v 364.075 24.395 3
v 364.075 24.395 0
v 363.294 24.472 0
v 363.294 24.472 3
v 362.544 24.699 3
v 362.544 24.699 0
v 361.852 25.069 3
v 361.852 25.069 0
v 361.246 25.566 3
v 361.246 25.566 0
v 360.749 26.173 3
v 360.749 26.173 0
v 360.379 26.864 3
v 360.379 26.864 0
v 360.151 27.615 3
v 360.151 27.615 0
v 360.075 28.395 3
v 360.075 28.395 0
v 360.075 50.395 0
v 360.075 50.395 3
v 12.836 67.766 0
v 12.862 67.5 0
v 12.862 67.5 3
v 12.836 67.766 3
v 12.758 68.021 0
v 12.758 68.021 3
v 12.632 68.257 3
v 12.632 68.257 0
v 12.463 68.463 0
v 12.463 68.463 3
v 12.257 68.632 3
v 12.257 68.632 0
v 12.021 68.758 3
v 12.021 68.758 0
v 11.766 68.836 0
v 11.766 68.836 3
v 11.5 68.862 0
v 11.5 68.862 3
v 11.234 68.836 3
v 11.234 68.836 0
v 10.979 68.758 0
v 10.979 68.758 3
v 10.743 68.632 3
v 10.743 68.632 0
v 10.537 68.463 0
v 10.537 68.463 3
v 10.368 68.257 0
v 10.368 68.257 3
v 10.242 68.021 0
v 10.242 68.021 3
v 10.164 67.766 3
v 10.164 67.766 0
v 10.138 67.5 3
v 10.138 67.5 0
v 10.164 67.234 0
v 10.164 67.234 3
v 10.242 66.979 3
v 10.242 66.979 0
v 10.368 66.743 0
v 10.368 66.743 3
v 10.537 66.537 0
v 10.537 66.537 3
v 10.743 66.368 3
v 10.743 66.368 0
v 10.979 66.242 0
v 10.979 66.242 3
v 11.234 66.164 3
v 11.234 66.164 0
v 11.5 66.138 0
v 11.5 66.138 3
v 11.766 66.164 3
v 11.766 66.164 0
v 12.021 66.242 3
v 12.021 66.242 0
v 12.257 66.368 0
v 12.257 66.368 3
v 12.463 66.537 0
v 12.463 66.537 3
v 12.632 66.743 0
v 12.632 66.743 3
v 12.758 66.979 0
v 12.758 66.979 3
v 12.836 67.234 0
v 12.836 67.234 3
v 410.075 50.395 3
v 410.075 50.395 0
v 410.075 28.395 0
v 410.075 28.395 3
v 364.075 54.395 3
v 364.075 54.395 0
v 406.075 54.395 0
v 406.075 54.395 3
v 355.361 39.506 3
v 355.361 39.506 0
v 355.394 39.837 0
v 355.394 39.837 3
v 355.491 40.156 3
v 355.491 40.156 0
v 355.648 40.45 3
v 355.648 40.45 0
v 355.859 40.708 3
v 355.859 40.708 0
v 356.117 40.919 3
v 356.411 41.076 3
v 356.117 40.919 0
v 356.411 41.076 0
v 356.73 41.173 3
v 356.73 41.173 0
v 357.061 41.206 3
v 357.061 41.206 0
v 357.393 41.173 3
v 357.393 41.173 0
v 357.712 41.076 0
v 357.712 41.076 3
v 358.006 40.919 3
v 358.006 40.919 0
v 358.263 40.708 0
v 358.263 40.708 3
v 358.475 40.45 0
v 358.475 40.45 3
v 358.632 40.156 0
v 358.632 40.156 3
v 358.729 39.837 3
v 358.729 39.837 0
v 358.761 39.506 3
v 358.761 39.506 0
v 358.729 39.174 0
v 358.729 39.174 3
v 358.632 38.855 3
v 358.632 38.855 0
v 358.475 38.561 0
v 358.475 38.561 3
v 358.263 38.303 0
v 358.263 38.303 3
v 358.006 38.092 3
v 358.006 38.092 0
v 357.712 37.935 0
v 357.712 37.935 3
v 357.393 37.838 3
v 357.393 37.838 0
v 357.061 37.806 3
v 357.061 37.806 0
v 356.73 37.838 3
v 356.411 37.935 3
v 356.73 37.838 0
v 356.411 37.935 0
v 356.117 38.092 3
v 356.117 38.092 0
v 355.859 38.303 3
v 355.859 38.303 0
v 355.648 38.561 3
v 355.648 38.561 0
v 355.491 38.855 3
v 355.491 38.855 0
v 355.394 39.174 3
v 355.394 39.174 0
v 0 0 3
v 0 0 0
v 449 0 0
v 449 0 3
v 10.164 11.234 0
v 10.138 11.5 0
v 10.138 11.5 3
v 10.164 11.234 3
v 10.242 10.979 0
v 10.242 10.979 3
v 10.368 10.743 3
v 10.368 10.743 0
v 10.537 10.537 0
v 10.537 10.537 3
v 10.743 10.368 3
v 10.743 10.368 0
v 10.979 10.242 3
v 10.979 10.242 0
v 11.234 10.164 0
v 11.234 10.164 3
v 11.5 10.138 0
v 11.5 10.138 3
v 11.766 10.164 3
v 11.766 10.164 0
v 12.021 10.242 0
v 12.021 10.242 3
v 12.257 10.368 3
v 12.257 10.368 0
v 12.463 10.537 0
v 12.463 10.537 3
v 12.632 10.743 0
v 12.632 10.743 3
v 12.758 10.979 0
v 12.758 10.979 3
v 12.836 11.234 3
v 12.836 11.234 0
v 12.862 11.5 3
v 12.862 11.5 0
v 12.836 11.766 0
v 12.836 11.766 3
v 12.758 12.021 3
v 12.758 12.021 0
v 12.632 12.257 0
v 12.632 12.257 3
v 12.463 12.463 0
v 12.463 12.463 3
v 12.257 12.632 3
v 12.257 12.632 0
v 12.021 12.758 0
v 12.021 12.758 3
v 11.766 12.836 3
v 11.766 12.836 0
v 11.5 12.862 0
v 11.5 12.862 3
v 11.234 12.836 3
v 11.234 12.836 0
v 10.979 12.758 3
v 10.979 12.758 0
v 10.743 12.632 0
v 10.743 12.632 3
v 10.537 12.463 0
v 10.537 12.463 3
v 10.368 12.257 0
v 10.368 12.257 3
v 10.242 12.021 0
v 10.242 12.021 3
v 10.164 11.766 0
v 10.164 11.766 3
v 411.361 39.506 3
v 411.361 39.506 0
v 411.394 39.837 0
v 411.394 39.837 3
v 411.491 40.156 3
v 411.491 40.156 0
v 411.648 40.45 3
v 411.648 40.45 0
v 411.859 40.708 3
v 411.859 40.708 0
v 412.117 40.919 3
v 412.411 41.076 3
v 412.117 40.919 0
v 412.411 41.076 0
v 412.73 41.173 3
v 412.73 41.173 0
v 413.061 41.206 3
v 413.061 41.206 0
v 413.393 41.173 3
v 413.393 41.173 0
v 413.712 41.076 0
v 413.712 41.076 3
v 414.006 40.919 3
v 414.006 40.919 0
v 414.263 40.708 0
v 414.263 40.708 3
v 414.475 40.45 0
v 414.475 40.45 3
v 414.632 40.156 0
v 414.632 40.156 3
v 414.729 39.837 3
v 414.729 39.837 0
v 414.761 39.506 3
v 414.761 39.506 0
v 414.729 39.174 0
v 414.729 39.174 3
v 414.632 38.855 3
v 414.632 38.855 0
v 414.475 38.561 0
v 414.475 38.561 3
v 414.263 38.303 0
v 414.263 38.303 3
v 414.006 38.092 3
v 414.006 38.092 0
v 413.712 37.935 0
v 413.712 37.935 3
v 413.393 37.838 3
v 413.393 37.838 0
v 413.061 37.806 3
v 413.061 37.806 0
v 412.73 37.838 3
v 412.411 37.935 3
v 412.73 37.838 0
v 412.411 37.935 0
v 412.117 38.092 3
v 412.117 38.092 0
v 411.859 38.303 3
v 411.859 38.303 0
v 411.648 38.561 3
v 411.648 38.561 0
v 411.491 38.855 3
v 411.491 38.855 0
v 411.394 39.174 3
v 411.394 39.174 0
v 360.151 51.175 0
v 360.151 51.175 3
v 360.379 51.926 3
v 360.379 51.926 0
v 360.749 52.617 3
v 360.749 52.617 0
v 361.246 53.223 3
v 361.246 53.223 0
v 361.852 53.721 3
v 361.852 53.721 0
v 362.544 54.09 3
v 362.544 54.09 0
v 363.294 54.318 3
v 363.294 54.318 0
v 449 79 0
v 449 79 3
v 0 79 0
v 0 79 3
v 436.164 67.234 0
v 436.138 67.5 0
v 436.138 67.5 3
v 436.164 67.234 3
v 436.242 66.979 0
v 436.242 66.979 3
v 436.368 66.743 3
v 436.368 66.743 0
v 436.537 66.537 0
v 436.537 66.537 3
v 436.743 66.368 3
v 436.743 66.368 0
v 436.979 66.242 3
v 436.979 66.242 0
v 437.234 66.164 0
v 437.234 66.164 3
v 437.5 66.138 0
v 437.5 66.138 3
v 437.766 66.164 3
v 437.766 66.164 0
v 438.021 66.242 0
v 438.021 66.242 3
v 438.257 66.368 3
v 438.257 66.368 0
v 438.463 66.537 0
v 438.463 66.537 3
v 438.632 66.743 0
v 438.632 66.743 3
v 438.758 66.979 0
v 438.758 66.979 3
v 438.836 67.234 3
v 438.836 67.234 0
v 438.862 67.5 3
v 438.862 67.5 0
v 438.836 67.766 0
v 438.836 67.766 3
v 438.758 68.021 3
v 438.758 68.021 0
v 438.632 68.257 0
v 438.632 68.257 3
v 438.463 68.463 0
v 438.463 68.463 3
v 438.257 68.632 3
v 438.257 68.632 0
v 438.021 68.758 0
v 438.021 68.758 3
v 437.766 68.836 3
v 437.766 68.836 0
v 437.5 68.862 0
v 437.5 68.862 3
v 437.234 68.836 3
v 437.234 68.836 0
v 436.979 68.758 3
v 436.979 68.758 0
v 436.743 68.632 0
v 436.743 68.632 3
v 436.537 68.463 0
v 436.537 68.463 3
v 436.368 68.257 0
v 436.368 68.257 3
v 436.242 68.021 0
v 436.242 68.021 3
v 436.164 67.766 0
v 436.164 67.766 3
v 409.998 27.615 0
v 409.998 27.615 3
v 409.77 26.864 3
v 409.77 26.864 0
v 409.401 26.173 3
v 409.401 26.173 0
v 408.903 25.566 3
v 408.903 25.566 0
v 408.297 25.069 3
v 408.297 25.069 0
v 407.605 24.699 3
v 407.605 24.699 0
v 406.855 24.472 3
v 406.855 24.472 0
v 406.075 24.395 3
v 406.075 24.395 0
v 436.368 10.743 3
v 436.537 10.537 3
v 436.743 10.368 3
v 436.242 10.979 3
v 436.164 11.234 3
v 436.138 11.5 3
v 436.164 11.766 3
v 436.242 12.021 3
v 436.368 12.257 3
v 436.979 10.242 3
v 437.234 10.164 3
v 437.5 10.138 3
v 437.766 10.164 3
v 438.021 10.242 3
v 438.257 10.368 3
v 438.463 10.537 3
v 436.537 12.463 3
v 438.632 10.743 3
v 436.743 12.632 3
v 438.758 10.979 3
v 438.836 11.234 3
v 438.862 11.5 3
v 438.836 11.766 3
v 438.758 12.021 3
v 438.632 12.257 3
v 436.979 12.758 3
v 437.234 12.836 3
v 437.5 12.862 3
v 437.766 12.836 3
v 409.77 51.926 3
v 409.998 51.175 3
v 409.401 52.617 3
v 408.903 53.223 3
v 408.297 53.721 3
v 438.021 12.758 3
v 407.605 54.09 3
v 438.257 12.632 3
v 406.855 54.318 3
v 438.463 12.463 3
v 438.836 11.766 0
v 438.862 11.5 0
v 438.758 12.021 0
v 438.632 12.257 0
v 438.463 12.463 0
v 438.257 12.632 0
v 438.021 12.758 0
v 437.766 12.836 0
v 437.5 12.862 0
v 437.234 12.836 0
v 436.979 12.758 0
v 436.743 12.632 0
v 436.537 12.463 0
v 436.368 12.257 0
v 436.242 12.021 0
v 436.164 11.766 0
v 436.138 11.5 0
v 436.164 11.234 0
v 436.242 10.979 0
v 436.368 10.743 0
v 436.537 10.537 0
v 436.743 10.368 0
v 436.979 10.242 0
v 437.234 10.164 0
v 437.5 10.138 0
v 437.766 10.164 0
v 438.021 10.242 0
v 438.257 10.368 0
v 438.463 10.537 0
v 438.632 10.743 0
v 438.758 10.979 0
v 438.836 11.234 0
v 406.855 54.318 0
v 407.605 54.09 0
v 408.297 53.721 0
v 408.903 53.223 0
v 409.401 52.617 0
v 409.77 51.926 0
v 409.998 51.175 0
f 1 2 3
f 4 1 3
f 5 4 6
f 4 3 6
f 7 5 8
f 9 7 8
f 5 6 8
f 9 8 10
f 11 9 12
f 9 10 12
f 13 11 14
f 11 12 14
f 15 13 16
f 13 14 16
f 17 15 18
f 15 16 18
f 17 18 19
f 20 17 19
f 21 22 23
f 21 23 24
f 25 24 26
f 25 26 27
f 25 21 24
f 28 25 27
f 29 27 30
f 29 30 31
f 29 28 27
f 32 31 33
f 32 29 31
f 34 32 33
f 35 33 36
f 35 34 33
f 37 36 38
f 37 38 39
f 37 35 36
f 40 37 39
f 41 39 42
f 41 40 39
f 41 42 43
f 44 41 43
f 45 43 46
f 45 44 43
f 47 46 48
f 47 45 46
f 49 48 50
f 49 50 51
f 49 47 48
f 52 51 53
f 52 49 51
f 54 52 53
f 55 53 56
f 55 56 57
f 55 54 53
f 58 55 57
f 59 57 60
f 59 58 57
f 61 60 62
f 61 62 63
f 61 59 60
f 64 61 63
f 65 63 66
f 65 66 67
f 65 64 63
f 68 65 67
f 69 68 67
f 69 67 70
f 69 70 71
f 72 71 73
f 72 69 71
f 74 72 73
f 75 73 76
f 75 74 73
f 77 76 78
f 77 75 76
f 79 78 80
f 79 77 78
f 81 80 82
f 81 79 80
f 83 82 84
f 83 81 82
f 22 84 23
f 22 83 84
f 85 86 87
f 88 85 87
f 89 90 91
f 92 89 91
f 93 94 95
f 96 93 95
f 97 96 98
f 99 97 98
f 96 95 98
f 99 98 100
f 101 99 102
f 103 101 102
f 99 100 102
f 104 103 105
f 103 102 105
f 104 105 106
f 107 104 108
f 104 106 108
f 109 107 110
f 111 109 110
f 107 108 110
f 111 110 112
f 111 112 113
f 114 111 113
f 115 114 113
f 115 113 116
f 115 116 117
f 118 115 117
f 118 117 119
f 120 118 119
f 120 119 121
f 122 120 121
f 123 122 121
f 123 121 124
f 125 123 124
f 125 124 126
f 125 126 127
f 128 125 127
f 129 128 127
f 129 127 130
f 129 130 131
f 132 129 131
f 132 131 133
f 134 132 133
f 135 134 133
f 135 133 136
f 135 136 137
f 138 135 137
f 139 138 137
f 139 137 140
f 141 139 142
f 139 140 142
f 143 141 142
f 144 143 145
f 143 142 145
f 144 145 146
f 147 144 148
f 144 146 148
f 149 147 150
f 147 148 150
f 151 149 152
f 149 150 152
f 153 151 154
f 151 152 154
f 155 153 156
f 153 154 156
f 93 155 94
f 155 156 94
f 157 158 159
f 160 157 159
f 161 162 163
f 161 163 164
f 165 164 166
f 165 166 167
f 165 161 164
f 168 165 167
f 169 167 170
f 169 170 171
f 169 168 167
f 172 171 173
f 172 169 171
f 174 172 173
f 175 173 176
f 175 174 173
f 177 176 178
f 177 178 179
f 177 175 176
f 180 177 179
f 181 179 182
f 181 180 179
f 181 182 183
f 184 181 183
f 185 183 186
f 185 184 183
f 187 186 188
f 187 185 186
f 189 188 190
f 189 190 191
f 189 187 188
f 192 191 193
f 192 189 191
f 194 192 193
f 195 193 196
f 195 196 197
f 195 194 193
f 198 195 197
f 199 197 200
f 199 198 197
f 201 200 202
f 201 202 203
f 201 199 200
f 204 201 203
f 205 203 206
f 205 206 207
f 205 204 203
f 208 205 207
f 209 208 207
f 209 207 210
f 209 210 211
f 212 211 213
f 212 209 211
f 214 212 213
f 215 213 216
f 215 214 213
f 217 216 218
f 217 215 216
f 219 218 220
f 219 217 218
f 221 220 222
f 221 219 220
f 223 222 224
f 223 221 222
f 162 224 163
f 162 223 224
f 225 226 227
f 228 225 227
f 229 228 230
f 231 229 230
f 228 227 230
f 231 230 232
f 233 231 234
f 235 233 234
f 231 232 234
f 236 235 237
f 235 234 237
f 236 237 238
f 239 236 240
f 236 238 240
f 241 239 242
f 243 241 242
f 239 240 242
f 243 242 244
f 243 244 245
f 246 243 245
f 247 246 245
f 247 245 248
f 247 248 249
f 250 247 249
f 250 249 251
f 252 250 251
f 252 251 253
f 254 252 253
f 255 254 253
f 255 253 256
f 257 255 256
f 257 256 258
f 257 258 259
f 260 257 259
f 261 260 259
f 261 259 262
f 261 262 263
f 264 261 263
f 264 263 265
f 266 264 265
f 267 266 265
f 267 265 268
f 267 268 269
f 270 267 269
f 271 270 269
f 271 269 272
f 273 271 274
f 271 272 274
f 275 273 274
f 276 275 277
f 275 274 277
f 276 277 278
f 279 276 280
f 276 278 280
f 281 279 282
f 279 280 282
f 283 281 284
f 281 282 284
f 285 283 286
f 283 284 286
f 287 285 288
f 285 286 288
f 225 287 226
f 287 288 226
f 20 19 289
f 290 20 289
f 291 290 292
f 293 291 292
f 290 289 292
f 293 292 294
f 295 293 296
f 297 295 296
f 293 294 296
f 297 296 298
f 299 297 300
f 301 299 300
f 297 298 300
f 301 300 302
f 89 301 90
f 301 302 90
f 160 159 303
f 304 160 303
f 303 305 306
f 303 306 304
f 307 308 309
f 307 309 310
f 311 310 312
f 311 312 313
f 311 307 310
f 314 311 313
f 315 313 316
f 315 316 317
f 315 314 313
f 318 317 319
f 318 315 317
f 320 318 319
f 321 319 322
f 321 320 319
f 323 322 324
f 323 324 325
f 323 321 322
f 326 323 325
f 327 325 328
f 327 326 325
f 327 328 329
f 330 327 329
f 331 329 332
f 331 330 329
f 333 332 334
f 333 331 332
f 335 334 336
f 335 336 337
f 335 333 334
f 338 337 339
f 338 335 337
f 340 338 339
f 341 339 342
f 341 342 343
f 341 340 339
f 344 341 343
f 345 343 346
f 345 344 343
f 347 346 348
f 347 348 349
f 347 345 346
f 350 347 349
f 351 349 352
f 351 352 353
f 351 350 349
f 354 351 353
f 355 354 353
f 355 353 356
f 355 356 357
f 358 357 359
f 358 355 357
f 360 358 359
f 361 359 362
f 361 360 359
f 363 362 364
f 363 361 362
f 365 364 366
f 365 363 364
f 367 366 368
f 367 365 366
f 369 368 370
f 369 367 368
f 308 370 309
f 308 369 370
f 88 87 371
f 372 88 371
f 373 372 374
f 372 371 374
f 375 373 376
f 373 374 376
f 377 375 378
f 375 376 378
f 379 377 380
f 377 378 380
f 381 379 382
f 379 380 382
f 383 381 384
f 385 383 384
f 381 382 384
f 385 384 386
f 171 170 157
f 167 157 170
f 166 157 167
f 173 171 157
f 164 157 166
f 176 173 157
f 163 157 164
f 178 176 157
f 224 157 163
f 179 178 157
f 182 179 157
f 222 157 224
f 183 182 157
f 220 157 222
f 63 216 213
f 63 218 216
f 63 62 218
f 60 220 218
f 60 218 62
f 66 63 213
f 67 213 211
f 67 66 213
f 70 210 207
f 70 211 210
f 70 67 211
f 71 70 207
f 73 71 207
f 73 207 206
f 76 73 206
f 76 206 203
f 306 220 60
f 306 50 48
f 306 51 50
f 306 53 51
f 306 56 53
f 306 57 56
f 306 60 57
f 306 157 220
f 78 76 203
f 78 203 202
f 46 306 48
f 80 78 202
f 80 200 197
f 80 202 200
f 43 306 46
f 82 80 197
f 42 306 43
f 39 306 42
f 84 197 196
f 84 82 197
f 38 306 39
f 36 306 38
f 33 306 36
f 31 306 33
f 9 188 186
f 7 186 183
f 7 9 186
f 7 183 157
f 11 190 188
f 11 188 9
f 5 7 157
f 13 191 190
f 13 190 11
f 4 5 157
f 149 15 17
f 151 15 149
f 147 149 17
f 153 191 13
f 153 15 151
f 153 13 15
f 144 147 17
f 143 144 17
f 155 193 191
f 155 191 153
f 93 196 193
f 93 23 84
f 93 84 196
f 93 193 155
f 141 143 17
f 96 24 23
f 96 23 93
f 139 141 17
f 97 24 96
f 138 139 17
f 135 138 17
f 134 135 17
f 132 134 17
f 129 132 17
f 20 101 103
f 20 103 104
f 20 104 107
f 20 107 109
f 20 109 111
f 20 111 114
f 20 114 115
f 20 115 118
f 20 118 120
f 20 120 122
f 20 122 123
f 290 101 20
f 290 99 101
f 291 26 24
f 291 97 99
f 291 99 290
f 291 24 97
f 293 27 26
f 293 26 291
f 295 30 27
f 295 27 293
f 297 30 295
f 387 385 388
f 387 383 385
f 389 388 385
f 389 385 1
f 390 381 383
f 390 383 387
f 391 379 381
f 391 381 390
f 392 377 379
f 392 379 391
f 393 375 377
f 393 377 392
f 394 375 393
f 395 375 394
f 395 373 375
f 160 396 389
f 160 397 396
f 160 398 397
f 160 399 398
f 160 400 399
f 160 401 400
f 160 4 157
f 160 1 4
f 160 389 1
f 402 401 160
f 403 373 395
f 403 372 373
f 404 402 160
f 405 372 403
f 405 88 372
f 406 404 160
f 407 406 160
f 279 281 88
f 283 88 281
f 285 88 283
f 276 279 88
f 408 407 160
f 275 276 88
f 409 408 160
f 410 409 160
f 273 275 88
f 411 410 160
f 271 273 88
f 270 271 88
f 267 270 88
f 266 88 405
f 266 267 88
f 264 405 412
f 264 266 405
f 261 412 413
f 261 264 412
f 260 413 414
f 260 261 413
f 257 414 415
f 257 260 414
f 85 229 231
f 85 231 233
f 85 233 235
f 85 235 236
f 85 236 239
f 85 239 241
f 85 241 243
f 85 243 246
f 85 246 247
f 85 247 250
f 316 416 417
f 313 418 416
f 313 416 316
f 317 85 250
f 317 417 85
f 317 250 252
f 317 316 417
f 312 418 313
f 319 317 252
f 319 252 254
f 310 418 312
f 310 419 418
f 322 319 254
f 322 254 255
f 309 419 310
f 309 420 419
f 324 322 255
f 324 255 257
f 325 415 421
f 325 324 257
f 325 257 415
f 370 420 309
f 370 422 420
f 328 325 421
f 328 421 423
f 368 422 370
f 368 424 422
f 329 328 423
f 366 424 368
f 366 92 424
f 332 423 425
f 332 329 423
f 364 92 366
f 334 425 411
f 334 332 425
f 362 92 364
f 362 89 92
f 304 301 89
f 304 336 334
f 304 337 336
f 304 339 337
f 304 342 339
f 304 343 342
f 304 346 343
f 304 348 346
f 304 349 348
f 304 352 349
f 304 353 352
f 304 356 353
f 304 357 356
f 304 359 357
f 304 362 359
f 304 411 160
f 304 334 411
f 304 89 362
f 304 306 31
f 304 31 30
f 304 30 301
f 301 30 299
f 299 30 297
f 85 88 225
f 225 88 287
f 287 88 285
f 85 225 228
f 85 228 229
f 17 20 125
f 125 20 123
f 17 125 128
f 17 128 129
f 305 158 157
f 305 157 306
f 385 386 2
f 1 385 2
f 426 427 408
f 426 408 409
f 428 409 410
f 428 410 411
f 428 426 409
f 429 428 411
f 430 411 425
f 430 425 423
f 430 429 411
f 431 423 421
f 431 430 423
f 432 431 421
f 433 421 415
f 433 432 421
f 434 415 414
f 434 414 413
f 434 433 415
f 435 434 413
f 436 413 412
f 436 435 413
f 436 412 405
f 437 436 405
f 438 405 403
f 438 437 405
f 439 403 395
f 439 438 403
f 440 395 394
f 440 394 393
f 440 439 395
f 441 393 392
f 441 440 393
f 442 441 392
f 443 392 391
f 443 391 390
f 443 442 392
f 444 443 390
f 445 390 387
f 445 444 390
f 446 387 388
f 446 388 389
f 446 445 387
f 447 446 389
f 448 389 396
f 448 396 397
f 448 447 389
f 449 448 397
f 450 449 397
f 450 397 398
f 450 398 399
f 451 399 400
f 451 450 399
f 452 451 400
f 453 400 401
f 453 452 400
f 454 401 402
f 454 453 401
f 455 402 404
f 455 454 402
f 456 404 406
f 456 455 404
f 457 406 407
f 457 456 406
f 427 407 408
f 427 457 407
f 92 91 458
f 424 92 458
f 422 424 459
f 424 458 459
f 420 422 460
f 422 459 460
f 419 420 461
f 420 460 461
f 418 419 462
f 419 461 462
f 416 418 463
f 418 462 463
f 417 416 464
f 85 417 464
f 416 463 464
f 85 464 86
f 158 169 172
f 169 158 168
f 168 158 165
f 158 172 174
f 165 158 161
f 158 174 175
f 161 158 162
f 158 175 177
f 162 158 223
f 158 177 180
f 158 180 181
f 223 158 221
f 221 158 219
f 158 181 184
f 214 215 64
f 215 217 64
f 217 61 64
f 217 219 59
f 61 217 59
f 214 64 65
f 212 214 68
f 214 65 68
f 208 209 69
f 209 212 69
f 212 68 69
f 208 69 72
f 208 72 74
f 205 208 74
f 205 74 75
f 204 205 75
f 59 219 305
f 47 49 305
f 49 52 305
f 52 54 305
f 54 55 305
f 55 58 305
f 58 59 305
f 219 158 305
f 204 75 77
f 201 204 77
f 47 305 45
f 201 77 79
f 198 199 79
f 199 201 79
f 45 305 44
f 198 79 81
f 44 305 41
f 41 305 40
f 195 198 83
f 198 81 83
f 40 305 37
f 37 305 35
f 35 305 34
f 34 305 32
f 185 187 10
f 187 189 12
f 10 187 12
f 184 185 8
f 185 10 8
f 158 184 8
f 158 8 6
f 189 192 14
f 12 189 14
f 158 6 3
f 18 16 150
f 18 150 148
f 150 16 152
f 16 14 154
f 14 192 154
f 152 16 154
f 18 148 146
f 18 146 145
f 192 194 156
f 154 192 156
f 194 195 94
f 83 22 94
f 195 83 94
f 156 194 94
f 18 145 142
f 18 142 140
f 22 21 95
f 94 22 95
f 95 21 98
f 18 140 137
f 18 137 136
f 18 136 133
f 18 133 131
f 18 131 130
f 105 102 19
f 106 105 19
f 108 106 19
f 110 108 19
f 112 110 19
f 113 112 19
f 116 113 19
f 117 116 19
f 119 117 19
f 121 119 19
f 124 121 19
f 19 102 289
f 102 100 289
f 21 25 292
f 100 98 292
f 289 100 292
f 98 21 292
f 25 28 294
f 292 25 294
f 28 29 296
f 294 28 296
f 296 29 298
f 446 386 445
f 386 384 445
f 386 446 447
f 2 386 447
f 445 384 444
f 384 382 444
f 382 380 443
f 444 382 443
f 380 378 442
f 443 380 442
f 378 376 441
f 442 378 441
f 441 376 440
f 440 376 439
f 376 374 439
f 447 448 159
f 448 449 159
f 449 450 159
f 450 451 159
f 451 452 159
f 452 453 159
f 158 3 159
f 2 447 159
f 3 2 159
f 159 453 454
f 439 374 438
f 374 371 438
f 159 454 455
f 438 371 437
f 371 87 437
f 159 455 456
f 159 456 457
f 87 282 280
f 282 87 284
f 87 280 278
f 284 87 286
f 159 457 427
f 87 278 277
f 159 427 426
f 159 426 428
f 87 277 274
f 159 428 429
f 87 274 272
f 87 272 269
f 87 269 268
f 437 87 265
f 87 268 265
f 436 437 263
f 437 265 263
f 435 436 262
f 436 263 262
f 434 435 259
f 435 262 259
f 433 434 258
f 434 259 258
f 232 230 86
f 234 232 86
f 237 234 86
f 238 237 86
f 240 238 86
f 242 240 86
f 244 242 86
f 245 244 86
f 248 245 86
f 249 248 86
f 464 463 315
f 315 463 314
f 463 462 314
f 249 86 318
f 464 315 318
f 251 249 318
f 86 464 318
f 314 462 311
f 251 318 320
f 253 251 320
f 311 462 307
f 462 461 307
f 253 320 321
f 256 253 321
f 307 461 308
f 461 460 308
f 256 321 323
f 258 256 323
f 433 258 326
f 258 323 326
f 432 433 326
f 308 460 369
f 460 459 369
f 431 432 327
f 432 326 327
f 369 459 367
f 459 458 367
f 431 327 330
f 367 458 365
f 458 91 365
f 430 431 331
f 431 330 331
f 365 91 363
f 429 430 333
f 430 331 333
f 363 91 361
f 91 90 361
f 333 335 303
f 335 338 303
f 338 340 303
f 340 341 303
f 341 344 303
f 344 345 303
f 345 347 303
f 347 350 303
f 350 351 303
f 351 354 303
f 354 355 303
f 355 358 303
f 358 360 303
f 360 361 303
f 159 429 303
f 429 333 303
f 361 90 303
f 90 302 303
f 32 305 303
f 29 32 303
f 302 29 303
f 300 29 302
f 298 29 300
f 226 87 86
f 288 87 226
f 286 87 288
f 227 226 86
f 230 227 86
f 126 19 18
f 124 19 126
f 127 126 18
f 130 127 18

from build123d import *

# Parameters (mm, degrees)
SKETCH_F_W                   = 449
SKETCH_F_H                   = 79
SKETCH_F_R                   = 1.361667817
ESTRUSIONE_ESTRUSIONE1_DEPTH = 3
SKETCH1_R                    = 1.7
EXTRUDE1_DEPTH               = 456.906788719


with BuildPart() as part:
    # Sketch f → Estrusione-Estrusione1 (new body)
    with BuildSketch(Plane.XY):
        with Locations((224.5, 39.5)):
            Rectangle(SKETCH_F_W, SKETCH_F_H)
        with Locations((11.5, 67.5)):
            Circle(SKETCH_F_R, mode=Mode.SUBTRACT)
        with Locations(Location((437.5, 67.5, 0), (0, 0, 180))):
            Circle(SKETCH_F_R, mode=Mode.SUBTRACT)
        with Locations(Location((11.5, 11.5, 0), (0, 0, 180))):
            Circle(SKETCH_F_R, mode=Mode.SUBTRACT)
        with Locations((437.5, 11.5)):
            Circle(SKETCH_F_R, mode=Mode.SUBTRACT)
    extrude(amount=ESTRUSIONE_ESTRUSIONE1_DEPTH)

    # Sketch1 → Extrude1 (cut, through all)
    with BuildSketch(Plane(origin=(0, 0, 0), x_dir=(-1, 0, 0), z_dir=(0, 0, -1))):
        with Locations((-413.061242298, 39.505506417)):
            Circle(SKETCH1_R)
        with Locations((-357.061242298, 39.505506417)):
            Circle(SKETCH1_R)
        with BuildLine():
            Line((-364.0746338, 54.394920259), (-406.0746338, 54.394920259))
            ThreePointArc((-406.0746338, 54.394920259), (-408.903060925, 53.223347384), (-410.0746338, 50.394920259))
            Line((-410.0746338, 50.394920259), (-410.0746338, 28.394920259))
            ThreePointArc((-410.0746338, 28.394920259), (-408.903060925, 25.566493134), (-406.0746338, 24.394920259))
            Line((-406.0746338, 24.394920259), (-364.0746338, 24.394920259))
            ThreePointArc((-364.0746338, 24.394920259), (-361.246206675, 25.566493134), (-360.0746338, 28.394920259))
            Line((-360.0746338, 28.394920259), (-360.0746338, 50.394920259))
            ThreePointArc((-360.0746338, 50.394920259), (-361.246206675, 53.223347384), (-364.0746338, 54.394920259))
        make_face()
    extrude(amount=-EXTRUDE1_DEPTH, mode=Mode.SUBTRACT)


solid = part.part
